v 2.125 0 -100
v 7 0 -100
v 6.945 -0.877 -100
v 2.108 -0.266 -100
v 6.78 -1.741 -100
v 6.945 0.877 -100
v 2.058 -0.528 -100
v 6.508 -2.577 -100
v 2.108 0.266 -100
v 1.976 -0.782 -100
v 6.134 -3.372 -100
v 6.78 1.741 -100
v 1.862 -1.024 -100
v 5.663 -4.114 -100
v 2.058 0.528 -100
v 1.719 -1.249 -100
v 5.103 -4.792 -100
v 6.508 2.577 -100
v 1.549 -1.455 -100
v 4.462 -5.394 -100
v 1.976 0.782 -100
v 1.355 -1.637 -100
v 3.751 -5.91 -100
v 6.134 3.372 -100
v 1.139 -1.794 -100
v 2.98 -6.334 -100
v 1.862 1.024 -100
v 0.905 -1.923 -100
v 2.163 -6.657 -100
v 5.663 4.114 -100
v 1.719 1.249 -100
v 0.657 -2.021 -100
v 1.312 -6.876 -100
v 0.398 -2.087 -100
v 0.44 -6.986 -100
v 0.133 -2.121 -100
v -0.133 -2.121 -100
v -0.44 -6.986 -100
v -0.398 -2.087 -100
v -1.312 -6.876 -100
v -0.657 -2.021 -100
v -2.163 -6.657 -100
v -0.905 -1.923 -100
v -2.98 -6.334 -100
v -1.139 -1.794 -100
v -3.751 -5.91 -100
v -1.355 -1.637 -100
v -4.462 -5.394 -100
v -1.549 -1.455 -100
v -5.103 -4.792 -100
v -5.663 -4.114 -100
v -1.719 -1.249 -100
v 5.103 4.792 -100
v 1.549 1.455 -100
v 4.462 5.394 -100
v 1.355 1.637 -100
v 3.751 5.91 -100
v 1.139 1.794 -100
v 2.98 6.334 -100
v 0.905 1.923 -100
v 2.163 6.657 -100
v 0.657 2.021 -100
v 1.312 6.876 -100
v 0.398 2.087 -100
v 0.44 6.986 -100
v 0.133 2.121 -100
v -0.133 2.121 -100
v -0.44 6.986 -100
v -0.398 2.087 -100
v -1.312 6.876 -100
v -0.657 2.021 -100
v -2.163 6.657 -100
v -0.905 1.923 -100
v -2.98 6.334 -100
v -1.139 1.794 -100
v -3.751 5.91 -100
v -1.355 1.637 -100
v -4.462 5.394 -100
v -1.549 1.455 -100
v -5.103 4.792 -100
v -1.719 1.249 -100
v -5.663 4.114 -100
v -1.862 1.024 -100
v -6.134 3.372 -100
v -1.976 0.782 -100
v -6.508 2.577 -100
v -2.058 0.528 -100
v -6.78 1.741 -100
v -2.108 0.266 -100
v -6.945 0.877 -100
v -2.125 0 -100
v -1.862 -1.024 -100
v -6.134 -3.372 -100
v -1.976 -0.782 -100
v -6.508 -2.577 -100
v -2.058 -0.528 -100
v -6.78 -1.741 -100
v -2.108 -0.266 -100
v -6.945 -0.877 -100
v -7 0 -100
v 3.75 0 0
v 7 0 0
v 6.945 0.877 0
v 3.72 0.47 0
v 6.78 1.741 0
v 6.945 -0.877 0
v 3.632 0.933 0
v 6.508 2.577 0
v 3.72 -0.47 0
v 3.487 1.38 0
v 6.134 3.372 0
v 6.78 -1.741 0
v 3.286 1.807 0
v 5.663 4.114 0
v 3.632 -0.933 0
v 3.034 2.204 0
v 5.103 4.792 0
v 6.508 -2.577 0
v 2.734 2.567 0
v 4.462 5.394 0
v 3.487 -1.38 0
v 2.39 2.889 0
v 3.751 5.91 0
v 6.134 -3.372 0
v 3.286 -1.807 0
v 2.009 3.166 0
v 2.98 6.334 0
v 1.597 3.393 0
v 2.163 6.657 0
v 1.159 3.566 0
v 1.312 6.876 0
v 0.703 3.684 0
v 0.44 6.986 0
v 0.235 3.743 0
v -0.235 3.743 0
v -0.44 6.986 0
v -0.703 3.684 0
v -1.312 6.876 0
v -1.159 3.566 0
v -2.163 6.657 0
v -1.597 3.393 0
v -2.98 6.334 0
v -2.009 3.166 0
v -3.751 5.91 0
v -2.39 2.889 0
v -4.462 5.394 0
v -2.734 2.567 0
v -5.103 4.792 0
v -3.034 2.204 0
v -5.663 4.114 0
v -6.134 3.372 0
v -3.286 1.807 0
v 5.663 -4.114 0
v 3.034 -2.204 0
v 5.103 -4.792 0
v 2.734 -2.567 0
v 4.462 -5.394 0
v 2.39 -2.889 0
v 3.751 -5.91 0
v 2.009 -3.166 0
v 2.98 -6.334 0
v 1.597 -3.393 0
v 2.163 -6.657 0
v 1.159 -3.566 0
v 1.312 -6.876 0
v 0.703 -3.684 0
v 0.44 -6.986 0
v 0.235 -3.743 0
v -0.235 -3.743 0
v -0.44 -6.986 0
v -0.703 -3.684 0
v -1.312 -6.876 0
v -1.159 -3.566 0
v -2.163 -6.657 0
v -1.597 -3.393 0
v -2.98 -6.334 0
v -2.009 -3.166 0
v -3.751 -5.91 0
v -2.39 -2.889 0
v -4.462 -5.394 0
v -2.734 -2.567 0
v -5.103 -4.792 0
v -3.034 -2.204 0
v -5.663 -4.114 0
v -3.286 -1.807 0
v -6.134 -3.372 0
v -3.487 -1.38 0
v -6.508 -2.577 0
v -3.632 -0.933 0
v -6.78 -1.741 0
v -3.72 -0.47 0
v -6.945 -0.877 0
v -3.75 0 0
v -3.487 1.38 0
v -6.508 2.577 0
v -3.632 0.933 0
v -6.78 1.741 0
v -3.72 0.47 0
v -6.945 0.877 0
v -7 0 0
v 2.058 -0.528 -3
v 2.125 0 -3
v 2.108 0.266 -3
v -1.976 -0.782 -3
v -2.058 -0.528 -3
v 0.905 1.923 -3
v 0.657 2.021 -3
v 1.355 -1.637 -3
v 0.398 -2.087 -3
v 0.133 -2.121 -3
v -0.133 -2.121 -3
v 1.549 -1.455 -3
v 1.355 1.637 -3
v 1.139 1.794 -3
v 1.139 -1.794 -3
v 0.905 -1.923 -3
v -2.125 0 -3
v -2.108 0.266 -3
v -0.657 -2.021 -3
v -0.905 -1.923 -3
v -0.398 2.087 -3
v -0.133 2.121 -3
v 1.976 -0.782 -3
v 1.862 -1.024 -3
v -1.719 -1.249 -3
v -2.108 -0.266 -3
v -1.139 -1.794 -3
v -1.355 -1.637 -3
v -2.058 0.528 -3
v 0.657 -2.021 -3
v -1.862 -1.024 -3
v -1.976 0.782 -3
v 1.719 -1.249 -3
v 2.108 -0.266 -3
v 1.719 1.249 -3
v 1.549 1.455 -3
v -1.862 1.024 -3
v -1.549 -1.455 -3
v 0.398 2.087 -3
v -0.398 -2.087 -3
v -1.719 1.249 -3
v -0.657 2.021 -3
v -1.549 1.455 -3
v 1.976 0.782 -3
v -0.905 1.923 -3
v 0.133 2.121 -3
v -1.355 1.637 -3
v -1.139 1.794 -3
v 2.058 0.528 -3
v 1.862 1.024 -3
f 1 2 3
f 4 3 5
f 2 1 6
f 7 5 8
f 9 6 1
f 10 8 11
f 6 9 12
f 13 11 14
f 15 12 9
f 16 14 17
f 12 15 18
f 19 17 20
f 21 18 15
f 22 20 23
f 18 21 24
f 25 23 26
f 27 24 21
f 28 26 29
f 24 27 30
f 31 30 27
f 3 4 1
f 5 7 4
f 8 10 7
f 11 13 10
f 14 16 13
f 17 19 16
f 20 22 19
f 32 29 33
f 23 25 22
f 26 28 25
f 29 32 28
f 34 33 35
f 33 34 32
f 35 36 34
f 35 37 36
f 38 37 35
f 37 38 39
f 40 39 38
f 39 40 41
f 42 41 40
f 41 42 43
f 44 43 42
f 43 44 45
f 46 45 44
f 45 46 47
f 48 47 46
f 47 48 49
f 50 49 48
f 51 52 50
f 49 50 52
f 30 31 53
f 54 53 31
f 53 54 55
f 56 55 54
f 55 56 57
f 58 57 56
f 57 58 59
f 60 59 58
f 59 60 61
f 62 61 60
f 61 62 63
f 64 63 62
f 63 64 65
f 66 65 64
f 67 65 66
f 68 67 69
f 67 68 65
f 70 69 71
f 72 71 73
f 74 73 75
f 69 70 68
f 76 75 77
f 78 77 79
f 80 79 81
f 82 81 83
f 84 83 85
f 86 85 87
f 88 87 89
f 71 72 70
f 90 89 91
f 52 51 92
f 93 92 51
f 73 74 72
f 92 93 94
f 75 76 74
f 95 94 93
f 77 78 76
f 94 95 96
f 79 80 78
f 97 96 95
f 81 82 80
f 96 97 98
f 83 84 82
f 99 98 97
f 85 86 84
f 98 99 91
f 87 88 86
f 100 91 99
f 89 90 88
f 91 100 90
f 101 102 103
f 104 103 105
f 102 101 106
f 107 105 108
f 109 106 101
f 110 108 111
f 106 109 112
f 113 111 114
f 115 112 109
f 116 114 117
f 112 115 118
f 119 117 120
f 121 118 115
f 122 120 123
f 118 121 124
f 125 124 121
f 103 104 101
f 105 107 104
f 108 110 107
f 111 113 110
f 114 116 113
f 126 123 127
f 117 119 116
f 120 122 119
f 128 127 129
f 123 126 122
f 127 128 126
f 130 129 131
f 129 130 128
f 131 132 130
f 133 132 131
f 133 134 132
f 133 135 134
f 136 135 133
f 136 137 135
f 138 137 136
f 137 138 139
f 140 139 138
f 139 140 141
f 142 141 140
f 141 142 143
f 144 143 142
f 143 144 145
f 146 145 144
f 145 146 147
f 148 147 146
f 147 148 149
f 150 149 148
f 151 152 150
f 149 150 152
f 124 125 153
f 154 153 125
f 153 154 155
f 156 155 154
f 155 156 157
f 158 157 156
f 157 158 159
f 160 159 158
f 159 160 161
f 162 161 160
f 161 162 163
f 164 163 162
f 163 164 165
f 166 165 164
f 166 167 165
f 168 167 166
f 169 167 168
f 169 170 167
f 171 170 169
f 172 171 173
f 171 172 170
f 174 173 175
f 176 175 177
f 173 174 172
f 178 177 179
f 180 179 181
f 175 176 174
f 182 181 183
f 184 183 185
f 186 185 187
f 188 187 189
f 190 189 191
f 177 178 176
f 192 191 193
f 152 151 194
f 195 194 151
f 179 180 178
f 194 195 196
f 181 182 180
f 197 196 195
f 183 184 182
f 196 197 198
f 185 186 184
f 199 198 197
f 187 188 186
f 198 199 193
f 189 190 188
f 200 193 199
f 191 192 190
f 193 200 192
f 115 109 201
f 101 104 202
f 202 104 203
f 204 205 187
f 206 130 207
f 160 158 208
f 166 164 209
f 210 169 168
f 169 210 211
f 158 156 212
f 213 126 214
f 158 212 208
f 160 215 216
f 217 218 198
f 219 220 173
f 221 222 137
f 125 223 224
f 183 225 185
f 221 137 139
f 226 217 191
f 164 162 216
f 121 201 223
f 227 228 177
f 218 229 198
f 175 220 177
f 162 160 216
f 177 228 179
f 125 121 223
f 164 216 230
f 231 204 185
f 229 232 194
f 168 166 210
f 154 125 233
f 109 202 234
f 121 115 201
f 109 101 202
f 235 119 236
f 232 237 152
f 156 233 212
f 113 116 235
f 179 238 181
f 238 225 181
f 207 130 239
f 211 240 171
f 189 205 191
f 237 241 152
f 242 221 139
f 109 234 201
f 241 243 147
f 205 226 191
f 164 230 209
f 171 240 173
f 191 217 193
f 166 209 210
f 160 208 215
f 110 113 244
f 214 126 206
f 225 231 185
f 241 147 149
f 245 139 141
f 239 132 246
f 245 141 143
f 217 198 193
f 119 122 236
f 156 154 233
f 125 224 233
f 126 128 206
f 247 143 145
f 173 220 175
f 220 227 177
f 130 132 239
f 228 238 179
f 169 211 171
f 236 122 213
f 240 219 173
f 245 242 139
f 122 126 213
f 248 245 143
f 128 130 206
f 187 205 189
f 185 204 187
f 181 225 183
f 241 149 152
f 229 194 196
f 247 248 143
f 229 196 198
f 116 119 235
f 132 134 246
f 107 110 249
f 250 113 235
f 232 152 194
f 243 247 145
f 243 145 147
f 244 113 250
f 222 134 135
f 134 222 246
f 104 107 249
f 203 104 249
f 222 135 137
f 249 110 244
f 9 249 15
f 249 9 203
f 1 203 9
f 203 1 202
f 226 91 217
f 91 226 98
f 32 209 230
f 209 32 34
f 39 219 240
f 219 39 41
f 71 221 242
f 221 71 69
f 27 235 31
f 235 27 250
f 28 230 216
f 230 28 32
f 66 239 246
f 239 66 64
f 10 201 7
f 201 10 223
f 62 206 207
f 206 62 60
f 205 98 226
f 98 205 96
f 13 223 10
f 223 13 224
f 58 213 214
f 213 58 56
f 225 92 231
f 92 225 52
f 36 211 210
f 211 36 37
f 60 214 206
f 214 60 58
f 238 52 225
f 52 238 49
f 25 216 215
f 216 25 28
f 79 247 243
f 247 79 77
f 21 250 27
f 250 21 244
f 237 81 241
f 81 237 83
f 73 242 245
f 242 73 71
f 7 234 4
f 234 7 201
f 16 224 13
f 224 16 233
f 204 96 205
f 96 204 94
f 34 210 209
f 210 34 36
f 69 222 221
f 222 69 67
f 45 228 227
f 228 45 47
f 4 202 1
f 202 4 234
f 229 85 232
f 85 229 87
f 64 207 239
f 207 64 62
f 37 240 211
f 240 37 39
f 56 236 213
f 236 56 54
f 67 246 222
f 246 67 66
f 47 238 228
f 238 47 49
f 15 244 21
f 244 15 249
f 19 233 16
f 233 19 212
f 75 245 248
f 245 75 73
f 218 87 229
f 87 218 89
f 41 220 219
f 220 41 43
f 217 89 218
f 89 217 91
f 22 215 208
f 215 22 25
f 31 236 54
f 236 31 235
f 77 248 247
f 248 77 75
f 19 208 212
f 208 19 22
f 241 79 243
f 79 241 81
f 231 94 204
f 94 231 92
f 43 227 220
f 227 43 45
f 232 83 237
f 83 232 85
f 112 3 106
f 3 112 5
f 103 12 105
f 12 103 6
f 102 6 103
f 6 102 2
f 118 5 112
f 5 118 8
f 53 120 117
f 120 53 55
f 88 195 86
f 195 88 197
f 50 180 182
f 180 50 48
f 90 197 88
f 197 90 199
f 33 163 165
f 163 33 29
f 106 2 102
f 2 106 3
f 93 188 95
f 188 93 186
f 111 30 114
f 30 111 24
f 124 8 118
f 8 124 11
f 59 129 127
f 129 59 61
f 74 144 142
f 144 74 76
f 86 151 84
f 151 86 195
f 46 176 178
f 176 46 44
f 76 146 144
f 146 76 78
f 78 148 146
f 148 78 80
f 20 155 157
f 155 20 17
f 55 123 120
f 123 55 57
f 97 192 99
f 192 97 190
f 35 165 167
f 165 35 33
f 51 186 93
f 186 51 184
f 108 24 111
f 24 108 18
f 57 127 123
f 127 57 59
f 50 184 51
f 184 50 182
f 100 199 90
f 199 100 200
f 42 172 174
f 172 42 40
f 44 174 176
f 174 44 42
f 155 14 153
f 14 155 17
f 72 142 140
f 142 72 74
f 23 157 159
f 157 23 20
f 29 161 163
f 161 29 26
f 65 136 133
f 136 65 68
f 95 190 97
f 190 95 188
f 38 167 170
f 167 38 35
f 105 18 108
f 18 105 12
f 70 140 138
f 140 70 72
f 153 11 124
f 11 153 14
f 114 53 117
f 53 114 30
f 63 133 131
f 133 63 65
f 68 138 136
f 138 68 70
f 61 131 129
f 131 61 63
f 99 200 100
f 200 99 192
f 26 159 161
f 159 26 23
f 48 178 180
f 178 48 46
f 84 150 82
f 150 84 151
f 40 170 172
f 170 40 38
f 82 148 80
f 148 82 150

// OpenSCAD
$fn = 50;


difference() {
	union() {
		translate(v = [0, 0, -100.0000000000]) {
			cylinder(h = 100, r = 7.0000000000);
		}
		cylinder(h = 0, r = 17.0000000000);
	}
	union() {
		translate(v = [0, 0, 0]) {
			rotate(a = [0, 0, 0]) {
				difference() {
					union() {
						#translate(v = [0, 0, -100.0000000000]) {
							cylinder(h = 100, r = 2.0000000000);
						}
						#translate(v = [0, 0, -3]) {
							cylinder(h = 3, r1 = 2.1250000000, r2 = 3.7500000000);
						}
						#translate(v = [0, 0, -100.0000000000]) {
							cylinder(h = 100, r = 2.1250000000);
						}
						#translate(v = [0, 0, -100.0000000000]) {
							cylinder(h = 100, r = 2.0000000000);
						}
					}
					union();
				}
			}
		}
	}
}
